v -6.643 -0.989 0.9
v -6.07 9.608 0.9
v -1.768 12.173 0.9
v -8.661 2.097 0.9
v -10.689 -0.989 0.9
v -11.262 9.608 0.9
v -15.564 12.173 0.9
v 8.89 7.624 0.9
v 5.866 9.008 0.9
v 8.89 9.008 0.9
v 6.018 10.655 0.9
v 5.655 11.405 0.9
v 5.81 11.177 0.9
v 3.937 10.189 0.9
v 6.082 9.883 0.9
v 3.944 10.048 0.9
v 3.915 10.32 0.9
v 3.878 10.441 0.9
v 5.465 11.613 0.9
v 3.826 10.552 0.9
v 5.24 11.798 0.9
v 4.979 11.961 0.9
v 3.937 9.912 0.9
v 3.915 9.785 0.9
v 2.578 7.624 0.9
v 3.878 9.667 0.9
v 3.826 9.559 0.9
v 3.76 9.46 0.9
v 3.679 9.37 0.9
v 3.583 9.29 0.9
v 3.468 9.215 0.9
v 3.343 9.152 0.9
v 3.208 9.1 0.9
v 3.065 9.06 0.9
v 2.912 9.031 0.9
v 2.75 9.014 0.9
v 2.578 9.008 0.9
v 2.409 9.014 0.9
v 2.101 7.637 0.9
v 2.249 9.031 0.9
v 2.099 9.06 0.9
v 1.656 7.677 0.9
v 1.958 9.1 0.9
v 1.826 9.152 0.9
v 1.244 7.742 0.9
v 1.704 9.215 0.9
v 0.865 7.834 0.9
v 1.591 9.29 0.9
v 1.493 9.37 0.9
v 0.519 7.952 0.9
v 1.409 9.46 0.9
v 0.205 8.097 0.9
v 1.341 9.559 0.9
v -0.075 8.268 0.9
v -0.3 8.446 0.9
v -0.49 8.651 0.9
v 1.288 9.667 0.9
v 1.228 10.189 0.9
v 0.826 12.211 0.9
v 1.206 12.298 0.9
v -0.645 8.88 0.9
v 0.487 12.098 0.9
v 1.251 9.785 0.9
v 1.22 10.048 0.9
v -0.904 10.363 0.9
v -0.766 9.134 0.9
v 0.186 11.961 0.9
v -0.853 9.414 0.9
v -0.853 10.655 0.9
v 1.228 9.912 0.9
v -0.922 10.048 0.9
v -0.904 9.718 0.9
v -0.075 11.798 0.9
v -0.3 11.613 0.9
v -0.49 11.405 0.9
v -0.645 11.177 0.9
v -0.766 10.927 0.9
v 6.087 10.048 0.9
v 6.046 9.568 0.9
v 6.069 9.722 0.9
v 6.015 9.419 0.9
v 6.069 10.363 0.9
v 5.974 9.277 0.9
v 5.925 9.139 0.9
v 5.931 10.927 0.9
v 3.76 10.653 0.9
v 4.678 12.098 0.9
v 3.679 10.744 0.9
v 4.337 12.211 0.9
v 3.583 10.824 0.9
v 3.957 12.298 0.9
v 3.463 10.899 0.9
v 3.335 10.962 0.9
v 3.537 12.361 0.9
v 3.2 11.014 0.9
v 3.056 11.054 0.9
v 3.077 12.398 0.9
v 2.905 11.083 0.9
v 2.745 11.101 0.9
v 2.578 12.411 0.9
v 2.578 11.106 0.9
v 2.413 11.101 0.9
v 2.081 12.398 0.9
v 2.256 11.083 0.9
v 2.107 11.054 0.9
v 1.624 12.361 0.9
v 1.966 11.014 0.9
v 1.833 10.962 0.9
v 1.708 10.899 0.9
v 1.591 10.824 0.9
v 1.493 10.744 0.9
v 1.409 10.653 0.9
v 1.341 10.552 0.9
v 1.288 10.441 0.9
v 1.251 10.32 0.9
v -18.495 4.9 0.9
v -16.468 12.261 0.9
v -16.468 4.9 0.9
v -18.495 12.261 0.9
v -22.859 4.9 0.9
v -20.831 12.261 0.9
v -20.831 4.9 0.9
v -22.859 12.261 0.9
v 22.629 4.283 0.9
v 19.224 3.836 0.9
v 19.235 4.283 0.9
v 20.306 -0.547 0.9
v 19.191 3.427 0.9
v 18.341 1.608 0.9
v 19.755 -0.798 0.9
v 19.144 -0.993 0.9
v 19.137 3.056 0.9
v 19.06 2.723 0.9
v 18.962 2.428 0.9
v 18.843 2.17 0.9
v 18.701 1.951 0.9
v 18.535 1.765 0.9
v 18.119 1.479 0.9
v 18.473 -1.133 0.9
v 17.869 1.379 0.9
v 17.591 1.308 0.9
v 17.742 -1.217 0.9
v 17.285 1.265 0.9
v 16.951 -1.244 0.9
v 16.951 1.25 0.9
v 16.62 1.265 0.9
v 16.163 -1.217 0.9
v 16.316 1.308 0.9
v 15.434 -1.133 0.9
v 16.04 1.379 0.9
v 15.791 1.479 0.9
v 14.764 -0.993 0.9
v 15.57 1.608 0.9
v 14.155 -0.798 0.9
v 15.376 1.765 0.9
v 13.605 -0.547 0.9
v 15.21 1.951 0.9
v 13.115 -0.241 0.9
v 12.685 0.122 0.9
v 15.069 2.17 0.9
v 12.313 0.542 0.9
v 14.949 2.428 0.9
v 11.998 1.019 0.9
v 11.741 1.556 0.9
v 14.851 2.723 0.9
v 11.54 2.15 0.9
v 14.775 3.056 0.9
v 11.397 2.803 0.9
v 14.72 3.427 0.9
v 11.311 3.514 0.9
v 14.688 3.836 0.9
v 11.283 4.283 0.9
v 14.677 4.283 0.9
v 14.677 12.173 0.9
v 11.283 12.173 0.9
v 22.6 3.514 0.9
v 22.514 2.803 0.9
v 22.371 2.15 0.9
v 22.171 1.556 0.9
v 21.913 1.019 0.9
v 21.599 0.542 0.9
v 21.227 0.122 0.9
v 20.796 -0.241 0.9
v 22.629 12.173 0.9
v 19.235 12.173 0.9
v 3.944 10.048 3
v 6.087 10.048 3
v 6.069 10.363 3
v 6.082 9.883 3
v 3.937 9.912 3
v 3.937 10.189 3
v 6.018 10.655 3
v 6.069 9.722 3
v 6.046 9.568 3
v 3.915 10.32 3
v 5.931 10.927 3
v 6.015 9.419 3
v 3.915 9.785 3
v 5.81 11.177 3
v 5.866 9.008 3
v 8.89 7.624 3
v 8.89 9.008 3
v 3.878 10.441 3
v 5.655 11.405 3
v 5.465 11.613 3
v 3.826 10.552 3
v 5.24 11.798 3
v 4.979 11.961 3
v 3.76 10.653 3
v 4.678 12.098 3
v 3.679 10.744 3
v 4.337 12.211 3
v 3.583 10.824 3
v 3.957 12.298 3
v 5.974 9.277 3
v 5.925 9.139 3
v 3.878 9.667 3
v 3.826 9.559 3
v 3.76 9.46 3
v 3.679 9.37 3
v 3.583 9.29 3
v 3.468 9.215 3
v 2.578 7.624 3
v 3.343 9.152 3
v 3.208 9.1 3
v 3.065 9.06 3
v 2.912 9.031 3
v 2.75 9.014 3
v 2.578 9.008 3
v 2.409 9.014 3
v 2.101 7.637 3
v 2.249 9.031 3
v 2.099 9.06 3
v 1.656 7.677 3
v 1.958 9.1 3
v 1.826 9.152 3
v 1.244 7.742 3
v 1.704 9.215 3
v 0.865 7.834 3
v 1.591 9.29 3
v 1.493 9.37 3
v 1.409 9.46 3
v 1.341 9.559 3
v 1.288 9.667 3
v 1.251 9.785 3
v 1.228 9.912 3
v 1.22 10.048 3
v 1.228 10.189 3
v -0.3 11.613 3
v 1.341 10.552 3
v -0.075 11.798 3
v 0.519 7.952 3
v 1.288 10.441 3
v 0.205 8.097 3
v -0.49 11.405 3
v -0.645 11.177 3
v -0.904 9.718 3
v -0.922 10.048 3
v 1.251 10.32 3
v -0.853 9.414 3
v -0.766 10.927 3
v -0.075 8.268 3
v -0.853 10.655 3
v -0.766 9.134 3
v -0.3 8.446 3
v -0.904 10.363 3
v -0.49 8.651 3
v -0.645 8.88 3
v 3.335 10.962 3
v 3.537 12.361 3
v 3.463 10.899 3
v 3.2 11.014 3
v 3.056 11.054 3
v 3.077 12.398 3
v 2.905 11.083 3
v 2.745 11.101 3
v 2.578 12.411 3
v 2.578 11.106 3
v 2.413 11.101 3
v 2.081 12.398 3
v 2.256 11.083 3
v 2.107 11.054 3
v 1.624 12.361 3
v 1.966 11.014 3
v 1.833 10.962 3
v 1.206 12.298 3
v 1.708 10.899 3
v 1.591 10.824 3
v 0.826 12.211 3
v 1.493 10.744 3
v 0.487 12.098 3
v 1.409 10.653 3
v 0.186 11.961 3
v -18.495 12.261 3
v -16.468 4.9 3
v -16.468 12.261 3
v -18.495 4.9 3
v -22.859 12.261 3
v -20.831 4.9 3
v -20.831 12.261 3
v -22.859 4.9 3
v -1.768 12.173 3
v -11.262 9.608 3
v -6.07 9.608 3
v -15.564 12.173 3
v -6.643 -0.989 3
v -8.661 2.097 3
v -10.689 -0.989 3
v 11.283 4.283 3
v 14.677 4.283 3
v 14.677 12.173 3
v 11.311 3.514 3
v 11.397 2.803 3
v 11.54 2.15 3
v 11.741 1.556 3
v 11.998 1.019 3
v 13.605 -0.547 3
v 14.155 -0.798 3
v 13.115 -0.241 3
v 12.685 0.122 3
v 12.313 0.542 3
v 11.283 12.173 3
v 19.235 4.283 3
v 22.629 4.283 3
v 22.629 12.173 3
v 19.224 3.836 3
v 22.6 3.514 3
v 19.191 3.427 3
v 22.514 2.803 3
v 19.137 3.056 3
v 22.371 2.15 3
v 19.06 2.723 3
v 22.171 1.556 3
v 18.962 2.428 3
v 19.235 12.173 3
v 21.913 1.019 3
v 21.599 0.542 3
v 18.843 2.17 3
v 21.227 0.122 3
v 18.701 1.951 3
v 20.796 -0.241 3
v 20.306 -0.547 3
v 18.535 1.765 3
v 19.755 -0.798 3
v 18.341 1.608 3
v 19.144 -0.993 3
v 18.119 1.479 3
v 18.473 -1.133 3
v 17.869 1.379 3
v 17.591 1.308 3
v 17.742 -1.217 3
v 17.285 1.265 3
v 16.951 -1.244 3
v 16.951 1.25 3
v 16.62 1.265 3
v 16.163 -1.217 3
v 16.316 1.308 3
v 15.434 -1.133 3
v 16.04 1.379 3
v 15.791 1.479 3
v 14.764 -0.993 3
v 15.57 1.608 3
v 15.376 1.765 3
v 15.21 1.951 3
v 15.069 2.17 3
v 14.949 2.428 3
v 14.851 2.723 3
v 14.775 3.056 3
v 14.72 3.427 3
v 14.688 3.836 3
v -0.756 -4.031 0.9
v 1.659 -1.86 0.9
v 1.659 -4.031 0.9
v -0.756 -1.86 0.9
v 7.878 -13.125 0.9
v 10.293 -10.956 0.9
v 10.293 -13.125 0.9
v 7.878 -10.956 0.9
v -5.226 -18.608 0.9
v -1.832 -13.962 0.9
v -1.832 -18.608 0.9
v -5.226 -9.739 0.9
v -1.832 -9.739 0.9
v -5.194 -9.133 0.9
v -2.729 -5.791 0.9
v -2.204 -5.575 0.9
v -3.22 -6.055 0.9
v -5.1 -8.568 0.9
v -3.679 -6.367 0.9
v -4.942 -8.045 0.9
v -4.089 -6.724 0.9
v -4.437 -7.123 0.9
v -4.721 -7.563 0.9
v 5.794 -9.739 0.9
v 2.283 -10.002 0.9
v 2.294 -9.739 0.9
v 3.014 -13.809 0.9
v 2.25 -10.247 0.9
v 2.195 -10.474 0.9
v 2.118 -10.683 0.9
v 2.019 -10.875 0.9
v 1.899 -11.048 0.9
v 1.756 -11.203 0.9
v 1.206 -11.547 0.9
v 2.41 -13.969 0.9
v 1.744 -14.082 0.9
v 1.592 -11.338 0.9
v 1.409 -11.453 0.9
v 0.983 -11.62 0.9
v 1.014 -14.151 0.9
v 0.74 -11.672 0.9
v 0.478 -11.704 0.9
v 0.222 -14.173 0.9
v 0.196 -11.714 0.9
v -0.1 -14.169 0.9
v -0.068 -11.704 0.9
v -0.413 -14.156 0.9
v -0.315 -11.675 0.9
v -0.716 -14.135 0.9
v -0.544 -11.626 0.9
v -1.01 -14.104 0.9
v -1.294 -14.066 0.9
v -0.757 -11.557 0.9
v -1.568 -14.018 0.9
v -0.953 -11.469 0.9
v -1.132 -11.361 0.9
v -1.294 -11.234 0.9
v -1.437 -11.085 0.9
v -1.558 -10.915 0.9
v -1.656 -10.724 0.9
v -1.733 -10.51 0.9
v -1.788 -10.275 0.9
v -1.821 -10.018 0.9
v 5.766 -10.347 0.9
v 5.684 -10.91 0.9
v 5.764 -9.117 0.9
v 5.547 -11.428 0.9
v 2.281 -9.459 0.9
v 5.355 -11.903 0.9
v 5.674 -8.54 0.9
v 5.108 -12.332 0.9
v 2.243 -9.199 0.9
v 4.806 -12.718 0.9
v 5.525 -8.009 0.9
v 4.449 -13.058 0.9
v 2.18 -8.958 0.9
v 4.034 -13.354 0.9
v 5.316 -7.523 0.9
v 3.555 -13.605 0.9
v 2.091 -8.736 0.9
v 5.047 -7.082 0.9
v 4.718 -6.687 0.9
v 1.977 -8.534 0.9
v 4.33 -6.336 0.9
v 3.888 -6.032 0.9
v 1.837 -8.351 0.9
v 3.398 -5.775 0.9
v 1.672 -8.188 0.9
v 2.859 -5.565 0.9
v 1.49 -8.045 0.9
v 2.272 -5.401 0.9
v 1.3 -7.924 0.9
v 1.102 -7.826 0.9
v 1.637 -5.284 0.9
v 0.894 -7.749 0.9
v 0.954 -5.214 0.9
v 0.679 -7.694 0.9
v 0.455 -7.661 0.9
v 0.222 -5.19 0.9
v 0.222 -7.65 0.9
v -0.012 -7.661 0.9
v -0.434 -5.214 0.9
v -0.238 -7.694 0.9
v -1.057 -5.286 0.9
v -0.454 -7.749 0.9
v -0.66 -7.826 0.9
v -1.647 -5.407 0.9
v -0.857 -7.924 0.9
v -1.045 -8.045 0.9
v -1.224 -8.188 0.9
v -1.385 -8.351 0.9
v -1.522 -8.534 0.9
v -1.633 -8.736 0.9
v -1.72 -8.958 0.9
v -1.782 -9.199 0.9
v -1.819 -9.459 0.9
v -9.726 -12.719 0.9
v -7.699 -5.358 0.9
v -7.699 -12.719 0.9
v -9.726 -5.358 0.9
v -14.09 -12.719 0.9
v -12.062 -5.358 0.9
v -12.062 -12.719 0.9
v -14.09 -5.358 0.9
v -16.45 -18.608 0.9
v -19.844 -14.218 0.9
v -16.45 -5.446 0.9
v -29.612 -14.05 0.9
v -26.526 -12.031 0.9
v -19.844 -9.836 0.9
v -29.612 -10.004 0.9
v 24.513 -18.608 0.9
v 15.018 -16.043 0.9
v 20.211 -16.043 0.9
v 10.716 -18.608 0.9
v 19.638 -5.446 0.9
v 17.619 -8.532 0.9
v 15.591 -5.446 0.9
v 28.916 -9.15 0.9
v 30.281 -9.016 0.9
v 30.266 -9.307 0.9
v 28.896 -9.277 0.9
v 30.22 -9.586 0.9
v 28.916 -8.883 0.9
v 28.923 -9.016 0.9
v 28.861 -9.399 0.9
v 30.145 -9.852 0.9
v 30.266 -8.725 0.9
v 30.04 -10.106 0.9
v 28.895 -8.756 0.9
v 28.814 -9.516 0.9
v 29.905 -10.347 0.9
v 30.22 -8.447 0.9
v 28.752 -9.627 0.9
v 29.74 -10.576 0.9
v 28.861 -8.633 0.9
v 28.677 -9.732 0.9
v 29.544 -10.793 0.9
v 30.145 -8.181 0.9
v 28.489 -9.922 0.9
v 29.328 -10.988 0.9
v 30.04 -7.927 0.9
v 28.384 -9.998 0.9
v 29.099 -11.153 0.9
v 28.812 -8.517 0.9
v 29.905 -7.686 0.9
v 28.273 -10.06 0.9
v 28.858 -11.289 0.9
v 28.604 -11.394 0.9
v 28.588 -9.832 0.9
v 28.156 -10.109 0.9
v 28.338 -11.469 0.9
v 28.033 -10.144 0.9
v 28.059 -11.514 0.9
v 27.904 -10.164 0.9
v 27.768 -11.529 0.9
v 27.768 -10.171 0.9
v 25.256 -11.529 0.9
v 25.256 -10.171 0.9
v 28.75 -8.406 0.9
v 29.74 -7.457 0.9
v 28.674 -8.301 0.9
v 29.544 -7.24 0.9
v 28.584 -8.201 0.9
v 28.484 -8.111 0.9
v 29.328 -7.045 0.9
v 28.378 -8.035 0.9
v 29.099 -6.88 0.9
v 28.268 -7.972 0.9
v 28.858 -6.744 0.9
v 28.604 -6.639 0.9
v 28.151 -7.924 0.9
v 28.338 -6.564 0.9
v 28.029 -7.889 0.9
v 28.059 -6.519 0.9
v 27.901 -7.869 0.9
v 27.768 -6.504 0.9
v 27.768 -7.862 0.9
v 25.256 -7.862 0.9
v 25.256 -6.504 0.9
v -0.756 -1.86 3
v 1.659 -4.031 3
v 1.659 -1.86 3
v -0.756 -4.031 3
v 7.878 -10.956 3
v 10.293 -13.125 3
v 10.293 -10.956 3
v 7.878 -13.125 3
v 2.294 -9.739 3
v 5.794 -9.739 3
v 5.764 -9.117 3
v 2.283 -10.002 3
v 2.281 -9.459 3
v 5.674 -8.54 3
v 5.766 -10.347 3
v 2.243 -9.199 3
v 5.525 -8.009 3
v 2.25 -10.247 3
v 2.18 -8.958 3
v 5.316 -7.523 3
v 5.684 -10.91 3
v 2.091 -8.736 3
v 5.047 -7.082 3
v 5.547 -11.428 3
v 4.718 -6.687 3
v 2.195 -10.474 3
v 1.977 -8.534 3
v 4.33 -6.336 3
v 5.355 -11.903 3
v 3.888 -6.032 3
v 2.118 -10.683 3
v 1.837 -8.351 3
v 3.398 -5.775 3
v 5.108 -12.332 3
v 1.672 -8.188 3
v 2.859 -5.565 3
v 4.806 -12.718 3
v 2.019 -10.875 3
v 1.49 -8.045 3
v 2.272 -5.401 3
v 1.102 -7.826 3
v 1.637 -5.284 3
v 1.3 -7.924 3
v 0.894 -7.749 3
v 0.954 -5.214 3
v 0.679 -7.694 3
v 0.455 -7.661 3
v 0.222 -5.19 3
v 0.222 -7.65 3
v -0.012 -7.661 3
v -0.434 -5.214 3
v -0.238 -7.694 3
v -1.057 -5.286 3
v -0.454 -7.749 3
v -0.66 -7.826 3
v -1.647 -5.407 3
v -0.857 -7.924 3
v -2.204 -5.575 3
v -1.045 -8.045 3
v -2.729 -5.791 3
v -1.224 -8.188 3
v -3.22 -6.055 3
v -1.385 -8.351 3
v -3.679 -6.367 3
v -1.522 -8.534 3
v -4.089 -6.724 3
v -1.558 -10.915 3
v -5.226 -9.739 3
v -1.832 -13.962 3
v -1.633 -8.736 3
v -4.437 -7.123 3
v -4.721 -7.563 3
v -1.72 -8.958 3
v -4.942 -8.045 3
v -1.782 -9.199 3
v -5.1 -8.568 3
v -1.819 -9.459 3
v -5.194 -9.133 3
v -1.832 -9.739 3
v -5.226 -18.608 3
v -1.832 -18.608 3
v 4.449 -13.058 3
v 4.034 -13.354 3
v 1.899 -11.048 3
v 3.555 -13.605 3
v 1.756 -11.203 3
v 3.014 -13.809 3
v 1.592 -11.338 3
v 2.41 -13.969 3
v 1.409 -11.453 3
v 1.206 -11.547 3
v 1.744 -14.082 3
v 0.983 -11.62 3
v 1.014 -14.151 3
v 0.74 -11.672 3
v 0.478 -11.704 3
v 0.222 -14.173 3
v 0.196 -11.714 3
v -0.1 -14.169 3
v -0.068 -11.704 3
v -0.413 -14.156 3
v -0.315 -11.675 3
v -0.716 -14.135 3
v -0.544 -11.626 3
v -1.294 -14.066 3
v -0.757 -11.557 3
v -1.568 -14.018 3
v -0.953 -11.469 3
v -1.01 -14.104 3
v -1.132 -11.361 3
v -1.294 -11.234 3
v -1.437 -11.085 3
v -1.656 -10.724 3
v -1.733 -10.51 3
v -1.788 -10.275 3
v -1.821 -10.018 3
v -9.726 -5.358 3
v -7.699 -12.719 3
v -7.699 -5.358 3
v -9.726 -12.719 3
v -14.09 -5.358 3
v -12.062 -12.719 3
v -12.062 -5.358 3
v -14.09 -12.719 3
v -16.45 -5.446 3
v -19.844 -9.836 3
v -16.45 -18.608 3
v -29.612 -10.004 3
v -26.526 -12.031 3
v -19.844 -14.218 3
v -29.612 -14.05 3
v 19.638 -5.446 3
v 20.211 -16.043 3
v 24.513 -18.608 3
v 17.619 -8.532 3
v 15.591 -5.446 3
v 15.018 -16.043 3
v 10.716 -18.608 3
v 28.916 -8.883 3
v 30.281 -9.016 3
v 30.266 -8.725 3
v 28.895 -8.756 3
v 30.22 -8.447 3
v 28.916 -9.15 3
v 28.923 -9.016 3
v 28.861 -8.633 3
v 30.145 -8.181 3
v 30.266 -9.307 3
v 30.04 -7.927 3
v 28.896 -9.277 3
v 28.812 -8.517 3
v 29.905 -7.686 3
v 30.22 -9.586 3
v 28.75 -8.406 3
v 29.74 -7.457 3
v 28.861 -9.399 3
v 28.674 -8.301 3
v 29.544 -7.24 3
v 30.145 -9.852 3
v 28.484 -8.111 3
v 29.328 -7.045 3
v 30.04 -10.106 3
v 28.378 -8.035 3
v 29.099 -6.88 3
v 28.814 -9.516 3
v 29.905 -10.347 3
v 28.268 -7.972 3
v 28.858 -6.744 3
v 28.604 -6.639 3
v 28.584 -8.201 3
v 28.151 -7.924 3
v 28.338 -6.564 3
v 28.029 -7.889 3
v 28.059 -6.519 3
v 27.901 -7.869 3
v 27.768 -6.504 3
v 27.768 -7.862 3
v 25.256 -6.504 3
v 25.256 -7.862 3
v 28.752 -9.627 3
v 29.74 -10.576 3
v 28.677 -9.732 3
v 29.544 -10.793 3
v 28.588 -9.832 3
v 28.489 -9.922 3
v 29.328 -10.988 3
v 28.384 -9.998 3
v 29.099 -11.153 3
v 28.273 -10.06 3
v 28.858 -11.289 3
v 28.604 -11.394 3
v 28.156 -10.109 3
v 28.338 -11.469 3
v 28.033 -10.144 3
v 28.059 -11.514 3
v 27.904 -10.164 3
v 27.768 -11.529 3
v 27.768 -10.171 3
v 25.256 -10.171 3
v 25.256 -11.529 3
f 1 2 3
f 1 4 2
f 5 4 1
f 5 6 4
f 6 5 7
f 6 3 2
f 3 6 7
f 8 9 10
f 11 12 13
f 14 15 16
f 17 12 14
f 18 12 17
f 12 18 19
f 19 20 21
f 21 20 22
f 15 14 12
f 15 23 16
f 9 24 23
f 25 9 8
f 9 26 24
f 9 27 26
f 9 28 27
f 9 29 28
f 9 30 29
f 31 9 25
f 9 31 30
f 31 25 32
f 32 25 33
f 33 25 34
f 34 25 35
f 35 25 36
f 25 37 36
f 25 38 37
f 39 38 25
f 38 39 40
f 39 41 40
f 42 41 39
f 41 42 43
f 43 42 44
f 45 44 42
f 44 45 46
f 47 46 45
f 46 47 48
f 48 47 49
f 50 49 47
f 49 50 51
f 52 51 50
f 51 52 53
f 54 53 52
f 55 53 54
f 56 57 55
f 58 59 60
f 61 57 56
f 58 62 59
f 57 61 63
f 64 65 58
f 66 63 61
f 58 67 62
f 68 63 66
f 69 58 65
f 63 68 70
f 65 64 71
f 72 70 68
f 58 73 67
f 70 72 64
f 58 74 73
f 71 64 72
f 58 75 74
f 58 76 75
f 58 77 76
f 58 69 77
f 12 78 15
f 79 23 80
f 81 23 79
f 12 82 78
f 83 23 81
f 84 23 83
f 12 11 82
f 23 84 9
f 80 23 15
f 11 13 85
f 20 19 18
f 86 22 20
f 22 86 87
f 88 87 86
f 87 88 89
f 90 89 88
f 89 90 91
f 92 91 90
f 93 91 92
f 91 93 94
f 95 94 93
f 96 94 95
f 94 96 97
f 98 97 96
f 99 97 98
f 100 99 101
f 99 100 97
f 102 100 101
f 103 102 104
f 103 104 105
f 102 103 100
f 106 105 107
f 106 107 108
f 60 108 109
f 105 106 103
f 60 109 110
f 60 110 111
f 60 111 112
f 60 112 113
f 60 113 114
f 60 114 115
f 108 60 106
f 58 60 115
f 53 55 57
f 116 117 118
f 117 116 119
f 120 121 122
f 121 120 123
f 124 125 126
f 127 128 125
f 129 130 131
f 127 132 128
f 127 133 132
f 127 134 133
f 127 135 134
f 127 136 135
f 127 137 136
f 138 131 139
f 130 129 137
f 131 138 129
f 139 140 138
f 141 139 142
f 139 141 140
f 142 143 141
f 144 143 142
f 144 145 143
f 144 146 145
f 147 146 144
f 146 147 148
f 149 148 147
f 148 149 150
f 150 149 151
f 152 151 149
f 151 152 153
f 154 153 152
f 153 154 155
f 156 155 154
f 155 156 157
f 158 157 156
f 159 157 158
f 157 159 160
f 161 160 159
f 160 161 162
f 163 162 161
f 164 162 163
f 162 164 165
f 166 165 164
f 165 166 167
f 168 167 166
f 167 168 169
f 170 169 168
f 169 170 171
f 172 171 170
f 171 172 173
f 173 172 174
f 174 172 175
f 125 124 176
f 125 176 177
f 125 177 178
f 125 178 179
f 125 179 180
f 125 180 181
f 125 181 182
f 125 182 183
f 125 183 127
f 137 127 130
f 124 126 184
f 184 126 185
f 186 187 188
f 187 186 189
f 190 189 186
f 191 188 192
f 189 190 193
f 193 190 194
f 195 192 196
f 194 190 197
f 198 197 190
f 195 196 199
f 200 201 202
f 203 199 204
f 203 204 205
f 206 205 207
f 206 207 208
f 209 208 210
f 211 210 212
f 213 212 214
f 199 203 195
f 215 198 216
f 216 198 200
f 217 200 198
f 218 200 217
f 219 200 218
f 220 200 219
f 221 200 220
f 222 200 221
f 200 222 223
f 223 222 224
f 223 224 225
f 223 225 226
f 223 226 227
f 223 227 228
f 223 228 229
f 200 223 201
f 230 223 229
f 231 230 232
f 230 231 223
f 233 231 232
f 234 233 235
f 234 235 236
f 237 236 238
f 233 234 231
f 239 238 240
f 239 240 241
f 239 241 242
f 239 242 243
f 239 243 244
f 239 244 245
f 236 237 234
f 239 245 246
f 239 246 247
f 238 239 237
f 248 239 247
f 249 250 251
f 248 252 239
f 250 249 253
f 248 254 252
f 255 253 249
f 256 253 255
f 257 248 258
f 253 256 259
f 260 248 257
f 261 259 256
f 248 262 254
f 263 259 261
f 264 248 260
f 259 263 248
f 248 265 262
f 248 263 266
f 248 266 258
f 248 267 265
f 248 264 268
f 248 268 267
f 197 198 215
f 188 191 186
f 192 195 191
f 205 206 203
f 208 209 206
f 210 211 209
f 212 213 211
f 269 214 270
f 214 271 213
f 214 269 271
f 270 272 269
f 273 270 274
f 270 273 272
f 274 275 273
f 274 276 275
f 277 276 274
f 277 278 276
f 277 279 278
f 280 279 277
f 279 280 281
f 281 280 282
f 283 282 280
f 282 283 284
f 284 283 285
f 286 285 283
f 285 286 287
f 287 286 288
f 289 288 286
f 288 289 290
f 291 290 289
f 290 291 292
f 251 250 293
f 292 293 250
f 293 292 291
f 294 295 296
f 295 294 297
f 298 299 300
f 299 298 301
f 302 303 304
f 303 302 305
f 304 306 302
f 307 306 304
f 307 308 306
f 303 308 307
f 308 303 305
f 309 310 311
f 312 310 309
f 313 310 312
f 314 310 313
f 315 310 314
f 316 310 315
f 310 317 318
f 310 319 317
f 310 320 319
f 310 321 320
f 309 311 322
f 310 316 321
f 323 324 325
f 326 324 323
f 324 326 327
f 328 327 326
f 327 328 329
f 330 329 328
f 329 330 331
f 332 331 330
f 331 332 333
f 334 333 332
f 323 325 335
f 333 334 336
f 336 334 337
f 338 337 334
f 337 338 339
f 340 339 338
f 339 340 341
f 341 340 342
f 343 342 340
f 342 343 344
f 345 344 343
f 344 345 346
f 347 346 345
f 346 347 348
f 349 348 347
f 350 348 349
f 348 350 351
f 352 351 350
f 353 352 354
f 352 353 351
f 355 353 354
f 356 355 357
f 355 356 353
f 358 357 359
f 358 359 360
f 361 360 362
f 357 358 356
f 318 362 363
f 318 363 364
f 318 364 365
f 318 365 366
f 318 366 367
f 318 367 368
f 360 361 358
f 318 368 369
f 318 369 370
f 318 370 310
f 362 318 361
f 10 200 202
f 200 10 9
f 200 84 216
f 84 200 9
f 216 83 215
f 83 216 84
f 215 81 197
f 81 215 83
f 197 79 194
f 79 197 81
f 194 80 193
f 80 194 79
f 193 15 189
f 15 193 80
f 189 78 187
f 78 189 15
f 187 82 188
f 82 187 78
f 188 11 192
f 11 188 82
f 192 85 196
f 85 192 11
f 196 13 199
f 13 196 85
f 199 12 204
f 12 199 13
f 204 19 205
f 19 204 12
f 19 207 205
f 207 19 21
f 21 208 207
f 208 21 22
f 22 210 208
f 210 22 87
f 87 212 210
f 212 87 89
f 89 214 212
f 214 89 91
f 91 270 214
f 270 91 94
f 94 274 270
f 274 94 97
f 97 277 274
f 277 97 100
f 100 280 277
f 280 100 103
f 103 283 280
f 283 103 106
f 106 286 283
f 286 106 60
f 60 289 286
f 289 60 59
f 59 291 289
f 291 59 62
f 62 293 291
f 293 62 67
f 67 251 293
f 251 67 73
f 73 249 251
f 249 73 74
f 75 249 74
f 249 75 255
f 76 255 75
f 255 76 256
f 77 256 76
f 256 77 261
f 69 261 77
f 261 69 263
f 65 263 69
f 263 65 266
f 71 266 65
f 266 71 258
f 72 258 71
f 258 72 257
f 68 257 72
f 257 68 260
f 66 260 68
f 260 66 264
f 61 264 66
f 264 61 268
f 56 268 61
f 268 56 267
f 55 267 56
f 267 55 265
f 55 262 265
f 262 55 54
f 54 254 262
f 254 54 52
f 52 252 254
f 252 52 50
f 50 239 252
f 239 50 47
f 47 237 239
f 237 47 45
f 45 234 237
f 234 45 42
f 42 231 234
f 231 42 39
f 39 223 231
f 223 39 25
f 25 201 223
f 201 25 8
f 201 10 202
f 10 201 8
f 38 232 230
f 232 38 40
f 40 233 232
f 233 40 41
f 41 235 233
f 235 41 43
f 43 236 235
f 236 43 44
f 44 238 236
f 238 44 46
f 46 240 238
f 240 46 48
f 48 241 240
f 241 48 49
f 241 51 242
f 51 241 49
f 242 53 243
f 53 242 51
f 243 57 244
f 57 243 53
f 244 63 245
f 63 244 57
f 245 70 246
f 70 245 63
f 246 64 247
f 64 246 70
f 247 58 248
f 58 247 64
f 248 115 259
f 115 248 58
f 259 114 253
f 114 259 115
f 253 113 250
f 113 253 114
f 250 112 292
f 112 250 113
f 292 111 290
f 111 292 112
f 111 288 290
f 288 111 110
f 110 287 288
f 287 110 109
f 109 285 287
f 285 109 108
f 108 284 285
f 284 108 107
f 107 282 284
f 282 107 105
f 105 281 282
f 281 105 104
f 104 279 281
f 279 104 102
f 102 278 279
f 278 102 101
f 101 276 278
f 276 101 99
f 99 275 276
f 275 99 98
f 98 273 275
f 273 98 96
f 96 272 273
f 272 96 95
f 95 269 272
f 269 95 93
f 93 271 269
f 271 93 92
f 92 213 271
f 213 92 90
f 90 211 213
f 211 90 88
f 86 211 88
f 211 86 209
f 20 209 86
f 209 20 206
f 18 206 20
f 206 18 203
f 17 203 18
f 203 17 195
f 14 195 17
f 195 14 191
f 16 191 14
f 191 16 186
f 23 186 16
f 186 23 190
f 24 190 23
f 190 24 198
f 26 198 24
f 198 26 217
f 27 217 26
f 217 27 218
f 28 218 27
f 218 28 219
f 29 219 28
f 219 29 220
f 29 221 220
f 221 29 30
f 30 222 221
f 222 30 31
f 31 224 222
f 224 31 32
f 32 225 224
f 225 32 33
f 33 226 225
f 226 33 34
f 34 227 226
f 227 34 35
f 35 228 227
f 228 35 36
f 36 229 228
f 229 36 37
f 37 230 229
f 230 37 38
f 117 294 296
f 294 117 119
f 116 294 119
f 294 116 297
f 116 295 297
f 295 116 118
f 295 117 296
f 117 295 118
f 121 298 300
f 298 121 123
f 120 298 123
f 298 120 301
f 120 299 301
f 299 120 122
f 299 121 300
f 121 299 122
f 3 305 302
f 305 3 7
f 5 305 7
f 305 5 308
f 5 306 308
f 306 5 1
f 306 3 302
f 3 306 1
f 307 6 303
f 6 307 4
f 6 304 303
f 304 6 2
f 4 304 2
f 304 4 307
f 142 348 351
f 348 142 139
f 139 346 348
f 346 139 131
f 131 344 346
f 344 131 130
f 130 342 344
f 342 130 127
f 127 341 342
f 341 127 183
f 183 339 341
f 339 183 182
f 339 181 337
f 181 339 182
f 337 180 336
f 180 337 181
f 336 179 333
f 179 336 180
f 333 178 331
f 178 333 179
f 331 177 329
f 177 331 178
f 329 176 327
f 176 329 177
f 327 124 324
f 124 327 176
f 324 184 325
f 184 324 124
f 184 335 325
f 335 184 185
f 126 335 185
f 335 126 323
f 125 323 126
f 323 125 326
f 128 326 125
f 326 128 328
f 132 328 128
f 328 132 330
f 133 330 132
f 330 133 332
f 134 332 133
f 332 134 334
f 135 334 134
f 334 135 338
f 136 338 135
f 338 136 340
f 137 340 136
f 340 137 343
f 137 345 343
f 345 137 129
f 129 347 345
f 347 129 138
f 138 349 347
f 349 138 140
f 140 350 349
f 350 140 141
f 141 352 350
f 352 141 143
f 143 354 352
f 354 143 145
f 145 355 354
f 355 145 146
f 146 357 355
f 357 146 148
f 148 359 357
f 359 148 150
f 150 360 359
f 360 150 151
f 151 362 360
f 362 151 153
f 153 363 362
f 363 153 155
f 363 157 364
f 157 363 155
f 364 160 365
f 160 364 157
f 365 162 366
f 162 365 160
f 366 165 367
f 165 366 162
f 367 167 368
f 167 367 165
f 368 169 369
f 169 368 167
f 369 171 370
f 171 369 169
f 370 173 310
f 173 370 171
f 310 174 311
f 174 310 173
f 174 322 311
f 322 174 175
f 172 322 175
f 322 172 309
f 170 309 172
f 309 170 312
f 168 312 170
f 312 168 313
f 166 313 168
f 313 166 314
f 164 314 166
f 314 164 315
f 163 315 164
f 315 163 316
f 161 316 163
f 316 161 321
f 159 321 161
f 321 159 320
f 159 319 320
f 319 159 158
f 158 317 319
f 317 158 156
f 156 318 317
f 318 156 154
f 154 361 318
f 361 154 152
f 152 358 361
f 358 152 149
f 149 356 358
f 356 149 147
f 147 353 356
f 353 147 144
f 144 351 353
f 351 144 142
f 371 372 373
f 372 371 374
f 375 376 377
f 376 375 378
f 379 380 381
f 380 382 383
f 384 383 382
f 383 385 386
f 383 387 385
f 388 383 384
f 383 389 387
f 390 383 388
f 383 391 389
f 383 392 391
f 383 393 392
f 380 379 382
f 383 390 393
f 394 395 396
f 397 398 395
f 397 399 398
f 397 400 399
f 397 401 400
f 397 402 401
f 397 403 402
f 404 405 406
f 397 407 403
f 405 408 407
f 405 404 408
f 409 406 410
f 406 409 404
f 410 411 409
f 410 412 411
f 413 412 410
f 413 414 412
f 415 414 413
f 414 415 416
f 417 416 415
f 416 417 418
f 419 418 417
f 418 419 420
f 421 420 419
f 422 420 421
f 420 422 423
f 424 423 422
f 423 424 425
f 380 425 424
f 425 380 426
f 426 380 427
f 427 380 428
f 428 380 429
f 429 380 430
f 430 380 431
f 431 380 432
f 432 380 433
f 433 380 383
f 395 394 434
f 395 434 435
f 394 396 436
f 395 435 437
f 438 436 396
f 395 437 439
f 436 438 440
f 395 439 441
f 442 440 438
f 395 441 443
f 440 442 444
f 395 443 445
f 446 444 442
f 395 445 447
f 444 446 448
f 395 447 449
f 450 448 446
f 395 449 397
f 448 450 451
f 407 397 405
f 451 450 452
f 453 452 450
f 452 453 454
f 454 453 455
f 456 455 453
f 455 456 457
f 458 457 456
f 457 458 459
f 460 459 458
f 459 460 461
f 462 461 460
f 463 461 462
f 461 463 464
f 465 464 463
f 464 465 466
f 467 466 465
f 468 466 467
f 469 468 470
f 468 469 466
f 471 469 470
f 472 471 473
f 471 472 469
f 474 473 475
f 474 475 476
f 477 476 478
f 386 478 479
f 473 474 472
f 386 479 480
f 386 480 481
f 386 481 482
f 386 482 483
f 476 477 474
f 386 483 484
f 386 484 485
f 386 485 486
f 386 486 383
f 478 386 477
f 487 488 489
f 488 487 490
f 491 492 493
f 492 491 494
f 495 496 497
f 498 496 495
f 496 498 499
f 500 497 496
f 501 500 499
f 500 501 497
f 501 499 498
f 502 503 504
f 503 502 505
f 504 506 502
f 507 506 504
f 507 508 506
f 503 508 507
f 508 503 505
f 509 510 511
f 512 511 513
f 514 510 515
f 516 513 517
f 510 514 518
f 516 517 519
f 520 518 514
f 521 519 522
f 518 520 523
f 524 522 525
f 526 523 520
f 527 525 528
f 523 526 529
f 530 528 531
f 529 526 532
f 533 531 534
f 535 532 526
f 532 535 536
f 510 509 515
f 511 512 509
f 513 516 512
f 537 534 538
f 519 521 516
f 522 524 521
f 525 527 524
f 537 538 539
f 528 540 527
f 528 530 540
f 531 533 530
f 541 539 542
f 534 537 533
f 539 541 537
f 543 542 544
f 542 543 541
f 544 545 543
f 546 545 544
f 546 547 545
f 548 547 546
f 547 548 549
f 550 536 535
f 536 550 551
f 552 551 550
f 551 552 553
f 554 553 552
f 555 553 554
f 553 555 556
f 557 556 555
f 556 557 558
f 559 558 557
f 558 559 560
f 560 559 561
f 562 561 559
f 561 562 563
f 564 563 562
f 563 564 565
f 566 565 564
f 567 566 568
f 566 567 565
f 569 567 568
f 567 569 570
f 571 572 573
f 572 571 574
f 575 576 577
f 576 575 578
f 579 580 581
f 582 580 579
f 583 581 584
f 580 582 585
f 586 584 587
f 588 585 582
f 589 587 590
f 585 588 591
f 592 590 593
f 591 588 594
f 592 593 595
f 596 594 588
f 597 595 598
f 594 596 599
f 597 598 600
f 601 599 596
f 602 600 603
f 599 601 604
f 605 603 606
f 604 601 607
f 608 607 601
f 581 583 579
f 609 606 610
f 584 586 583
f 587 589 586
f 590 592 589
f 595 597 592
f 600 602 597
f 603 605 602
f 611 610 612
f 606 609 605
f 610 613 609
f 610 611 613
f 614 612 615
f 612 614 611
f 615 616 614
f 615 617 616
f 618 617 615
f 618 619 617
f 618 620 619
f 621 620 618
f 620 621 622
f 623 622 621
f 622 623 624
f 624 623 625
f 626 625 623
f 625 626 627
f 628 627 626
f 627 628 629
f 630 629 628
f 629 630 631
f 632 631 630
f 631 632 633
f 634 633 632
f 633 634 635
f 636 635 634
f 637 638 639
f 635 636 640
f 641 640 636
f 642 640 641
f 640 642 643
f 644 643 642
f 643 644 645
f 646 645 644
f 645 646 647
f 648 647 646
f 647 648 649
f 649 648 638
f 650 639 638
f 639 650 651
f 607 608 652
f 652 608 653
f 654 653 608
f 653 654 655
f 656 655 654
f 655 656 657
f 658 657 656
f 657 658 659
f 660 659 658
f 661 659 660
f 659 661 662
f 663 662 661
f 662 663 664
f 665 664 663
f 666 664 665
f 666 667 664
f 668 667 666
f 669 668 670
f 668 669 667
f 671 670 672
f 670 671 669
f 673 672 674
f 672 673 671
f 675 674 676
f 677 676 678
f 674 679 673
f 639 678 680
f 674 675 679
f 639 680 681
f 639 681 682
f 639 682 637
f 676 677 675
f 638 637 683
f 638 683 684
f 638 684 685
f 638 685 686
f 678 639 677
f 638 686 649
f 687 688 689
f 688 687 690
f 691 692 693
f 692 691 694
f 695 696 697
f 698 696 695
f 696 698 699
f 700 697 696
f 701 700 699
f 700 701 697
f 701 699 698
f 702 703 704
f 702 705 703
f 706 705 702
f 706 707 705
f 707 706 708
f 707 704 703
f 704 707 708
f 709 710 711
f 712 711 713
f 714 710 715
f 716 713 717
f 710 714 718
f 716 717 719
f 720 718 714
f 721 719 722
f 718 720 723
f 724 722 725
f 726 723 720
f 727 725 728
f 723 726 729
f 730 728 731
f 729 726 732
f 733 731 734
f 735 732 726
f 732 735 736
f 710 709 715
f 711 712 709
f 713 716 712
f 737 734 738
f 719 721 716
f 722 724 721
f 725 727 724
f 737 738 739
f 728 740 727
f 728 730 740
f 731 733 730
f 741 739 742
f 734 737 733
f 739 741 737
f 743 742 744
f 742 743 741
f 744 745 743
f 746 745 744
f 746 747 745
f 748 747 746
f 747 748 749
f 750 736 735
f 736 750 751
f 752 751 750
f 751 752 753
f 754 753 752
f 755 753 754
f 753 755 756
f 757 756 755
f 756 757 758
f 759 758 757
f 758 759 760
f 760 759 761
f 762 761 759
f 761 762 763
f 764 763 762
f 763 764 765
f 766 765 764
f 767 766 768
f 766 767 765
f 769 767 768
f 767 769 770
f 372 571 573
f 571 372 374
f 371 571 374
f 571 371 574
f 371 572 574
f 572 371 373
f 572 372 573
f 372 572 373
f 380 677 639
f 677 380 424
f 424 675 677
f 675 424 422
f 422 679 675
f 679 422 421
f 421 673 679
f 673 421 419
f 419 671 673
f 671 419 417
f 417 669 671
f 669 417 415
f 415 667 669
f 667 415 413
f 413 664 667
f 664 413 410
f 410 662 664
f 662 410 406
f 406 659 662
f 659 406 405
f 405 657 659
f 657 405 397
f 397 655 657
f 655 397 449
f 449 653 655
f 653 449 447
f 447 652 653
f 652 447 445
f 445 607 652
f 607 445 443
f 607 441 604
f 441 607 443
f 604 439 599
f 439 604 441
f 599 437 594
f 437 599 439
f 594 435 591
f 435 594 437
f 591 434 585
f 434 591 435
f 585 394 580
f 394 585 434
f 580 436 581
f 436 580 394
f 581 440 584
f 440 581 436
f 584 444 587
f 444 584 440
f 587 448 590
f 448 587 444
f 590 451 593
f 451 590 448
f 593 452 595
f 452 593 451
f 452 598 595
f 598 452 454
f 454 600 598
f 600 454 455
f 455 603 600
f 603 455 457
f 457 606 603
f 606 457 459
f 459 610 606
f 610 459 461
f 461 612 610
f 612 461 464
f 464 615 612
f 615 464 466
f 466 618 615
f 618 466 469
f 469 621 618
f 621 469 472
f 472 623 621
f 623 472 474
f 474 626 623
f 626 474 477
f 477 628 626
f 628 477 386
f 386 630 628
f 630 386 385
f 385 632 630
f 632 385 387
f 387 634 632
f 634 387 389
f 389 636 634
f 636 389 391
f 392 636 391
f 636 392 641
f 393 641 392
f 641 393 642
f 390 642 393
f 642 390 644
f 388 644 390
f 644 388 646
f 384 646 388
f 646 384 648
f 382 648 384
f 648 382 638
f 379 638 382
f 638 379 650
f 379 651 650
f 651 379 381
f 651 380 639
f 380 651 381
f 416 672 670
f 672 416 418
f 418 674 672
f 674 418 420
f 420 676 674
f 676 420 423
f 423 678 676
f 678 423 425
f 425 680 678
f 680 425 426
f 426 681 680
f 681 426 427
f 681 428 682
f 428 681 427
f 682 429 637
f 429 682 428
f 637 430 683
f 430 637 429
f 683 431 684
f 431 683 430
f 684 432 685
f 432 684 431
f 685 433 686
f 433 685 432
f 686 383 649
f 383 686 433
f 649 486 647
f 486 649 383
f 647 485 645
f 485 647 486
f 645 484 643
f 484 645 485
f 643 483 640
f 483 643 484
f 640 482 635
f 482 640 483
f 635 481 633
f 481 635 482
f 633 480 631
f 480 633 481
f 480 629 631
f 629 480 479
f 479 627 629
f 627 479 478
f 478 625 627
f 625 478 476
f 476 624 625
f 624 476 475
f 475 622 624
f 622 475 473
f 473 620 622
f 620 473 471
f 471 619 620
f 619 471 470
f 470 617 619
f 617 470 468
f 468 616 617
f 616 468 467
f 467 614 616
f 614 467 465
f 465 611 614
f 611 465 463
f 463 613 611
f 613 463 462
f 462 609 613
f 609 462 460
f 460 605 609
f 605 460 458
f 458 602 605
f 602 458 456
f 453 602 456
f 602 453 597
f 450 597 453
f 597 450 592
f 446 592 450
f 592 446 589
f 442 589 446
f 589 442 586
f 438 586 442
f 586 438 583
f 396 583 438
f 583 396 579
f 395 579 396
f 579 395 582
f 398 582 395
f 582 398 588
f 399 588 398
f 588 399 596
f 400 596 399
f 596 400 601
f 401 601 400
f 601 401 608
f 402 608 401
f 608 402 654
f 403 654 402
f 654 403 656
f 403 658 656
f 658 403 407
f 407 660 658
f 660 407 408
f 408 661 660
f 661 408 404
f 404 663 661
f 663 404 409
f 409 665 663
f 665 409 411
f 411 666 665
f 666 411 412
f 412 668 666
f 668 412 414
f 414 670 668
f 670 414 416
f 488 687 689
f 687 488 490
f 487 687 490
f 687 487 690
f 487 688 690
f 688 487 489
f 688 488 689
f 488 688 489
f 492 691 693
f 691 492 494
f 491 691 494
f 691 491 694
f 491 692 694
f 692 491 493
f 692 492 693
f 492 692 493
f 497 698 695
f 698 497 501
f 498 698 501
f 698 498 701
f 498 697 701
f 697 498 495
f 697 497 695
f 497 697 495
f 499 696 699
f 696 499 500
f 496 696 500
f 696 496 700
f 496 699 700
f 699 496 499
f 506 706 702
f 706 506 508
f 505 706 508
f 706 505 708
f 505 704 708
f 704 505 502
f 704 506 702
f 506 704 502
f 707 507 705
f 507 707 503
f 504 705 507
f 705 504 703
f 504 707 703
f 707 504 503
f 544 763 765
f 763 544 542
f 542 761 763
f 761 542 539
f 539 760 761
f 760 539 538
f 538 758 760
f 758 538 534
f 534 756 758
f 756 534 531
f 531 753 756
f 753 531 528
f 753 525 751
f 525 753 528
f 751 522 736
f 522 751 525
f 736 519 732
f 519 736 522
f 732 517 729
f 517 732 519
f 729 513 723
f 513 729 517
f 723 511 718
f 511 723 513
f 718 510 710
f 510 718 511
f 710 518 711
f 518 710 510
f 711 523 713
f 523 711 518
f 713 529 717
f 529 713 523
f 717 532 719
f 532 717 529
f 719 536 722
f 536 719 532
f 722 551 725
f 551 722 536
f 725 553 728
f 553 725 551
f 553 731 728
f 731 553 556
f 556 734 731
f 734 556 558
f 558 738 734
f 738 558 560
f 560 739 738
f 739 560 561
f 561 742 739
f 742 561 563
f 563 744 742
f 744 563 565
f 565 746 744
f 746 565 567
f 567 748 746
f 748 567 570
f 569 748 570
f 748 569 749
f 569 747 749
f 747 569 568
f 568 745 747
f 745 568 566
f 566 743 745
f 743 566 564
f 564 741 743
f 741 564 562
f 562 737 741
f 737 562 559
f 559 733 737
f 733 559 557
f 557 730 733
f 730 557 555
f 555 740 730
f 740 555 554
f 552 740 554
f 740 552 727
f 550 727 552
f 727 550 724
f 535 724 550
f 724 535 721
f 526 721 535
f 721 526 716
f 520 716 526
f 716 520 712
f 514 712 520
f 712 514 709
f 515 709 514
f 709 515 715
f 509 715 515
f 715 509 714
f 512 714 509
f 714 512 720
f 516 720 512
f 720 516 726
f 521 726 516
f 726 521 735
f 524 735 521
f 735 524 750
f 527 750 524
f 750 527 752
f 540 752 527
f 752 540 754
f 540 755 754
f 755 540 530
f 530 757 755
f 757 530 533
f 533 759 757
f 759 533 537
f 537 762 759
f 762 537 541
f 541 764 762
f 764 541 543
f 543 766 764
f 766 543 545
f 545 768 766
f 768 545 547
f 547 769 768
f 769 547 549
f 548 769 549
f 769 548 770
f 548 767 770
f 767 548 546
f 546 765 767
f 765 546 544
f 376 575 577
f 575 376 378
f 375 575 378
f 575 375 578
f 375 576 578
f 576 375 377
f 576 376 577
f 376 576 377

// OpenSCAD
$fn = 48;
  // syllabics (overlaid on icon, tallest)
  translate([0, 5.430, 0.900]) linear_extrude(height=2.100) text("ᐦᐁᓐᑌ", size=13.000, halign="center", valign="center", font="Euphemia UCAS:style=Bold");
  translate([0, -10.430, 0.900]) linear_extrude(height=2.100) text("ᐊᐦᑮᐎᐣ", size=13.000, halign="center", valign="center", font="Euphemia UCAS:style=Bold");
